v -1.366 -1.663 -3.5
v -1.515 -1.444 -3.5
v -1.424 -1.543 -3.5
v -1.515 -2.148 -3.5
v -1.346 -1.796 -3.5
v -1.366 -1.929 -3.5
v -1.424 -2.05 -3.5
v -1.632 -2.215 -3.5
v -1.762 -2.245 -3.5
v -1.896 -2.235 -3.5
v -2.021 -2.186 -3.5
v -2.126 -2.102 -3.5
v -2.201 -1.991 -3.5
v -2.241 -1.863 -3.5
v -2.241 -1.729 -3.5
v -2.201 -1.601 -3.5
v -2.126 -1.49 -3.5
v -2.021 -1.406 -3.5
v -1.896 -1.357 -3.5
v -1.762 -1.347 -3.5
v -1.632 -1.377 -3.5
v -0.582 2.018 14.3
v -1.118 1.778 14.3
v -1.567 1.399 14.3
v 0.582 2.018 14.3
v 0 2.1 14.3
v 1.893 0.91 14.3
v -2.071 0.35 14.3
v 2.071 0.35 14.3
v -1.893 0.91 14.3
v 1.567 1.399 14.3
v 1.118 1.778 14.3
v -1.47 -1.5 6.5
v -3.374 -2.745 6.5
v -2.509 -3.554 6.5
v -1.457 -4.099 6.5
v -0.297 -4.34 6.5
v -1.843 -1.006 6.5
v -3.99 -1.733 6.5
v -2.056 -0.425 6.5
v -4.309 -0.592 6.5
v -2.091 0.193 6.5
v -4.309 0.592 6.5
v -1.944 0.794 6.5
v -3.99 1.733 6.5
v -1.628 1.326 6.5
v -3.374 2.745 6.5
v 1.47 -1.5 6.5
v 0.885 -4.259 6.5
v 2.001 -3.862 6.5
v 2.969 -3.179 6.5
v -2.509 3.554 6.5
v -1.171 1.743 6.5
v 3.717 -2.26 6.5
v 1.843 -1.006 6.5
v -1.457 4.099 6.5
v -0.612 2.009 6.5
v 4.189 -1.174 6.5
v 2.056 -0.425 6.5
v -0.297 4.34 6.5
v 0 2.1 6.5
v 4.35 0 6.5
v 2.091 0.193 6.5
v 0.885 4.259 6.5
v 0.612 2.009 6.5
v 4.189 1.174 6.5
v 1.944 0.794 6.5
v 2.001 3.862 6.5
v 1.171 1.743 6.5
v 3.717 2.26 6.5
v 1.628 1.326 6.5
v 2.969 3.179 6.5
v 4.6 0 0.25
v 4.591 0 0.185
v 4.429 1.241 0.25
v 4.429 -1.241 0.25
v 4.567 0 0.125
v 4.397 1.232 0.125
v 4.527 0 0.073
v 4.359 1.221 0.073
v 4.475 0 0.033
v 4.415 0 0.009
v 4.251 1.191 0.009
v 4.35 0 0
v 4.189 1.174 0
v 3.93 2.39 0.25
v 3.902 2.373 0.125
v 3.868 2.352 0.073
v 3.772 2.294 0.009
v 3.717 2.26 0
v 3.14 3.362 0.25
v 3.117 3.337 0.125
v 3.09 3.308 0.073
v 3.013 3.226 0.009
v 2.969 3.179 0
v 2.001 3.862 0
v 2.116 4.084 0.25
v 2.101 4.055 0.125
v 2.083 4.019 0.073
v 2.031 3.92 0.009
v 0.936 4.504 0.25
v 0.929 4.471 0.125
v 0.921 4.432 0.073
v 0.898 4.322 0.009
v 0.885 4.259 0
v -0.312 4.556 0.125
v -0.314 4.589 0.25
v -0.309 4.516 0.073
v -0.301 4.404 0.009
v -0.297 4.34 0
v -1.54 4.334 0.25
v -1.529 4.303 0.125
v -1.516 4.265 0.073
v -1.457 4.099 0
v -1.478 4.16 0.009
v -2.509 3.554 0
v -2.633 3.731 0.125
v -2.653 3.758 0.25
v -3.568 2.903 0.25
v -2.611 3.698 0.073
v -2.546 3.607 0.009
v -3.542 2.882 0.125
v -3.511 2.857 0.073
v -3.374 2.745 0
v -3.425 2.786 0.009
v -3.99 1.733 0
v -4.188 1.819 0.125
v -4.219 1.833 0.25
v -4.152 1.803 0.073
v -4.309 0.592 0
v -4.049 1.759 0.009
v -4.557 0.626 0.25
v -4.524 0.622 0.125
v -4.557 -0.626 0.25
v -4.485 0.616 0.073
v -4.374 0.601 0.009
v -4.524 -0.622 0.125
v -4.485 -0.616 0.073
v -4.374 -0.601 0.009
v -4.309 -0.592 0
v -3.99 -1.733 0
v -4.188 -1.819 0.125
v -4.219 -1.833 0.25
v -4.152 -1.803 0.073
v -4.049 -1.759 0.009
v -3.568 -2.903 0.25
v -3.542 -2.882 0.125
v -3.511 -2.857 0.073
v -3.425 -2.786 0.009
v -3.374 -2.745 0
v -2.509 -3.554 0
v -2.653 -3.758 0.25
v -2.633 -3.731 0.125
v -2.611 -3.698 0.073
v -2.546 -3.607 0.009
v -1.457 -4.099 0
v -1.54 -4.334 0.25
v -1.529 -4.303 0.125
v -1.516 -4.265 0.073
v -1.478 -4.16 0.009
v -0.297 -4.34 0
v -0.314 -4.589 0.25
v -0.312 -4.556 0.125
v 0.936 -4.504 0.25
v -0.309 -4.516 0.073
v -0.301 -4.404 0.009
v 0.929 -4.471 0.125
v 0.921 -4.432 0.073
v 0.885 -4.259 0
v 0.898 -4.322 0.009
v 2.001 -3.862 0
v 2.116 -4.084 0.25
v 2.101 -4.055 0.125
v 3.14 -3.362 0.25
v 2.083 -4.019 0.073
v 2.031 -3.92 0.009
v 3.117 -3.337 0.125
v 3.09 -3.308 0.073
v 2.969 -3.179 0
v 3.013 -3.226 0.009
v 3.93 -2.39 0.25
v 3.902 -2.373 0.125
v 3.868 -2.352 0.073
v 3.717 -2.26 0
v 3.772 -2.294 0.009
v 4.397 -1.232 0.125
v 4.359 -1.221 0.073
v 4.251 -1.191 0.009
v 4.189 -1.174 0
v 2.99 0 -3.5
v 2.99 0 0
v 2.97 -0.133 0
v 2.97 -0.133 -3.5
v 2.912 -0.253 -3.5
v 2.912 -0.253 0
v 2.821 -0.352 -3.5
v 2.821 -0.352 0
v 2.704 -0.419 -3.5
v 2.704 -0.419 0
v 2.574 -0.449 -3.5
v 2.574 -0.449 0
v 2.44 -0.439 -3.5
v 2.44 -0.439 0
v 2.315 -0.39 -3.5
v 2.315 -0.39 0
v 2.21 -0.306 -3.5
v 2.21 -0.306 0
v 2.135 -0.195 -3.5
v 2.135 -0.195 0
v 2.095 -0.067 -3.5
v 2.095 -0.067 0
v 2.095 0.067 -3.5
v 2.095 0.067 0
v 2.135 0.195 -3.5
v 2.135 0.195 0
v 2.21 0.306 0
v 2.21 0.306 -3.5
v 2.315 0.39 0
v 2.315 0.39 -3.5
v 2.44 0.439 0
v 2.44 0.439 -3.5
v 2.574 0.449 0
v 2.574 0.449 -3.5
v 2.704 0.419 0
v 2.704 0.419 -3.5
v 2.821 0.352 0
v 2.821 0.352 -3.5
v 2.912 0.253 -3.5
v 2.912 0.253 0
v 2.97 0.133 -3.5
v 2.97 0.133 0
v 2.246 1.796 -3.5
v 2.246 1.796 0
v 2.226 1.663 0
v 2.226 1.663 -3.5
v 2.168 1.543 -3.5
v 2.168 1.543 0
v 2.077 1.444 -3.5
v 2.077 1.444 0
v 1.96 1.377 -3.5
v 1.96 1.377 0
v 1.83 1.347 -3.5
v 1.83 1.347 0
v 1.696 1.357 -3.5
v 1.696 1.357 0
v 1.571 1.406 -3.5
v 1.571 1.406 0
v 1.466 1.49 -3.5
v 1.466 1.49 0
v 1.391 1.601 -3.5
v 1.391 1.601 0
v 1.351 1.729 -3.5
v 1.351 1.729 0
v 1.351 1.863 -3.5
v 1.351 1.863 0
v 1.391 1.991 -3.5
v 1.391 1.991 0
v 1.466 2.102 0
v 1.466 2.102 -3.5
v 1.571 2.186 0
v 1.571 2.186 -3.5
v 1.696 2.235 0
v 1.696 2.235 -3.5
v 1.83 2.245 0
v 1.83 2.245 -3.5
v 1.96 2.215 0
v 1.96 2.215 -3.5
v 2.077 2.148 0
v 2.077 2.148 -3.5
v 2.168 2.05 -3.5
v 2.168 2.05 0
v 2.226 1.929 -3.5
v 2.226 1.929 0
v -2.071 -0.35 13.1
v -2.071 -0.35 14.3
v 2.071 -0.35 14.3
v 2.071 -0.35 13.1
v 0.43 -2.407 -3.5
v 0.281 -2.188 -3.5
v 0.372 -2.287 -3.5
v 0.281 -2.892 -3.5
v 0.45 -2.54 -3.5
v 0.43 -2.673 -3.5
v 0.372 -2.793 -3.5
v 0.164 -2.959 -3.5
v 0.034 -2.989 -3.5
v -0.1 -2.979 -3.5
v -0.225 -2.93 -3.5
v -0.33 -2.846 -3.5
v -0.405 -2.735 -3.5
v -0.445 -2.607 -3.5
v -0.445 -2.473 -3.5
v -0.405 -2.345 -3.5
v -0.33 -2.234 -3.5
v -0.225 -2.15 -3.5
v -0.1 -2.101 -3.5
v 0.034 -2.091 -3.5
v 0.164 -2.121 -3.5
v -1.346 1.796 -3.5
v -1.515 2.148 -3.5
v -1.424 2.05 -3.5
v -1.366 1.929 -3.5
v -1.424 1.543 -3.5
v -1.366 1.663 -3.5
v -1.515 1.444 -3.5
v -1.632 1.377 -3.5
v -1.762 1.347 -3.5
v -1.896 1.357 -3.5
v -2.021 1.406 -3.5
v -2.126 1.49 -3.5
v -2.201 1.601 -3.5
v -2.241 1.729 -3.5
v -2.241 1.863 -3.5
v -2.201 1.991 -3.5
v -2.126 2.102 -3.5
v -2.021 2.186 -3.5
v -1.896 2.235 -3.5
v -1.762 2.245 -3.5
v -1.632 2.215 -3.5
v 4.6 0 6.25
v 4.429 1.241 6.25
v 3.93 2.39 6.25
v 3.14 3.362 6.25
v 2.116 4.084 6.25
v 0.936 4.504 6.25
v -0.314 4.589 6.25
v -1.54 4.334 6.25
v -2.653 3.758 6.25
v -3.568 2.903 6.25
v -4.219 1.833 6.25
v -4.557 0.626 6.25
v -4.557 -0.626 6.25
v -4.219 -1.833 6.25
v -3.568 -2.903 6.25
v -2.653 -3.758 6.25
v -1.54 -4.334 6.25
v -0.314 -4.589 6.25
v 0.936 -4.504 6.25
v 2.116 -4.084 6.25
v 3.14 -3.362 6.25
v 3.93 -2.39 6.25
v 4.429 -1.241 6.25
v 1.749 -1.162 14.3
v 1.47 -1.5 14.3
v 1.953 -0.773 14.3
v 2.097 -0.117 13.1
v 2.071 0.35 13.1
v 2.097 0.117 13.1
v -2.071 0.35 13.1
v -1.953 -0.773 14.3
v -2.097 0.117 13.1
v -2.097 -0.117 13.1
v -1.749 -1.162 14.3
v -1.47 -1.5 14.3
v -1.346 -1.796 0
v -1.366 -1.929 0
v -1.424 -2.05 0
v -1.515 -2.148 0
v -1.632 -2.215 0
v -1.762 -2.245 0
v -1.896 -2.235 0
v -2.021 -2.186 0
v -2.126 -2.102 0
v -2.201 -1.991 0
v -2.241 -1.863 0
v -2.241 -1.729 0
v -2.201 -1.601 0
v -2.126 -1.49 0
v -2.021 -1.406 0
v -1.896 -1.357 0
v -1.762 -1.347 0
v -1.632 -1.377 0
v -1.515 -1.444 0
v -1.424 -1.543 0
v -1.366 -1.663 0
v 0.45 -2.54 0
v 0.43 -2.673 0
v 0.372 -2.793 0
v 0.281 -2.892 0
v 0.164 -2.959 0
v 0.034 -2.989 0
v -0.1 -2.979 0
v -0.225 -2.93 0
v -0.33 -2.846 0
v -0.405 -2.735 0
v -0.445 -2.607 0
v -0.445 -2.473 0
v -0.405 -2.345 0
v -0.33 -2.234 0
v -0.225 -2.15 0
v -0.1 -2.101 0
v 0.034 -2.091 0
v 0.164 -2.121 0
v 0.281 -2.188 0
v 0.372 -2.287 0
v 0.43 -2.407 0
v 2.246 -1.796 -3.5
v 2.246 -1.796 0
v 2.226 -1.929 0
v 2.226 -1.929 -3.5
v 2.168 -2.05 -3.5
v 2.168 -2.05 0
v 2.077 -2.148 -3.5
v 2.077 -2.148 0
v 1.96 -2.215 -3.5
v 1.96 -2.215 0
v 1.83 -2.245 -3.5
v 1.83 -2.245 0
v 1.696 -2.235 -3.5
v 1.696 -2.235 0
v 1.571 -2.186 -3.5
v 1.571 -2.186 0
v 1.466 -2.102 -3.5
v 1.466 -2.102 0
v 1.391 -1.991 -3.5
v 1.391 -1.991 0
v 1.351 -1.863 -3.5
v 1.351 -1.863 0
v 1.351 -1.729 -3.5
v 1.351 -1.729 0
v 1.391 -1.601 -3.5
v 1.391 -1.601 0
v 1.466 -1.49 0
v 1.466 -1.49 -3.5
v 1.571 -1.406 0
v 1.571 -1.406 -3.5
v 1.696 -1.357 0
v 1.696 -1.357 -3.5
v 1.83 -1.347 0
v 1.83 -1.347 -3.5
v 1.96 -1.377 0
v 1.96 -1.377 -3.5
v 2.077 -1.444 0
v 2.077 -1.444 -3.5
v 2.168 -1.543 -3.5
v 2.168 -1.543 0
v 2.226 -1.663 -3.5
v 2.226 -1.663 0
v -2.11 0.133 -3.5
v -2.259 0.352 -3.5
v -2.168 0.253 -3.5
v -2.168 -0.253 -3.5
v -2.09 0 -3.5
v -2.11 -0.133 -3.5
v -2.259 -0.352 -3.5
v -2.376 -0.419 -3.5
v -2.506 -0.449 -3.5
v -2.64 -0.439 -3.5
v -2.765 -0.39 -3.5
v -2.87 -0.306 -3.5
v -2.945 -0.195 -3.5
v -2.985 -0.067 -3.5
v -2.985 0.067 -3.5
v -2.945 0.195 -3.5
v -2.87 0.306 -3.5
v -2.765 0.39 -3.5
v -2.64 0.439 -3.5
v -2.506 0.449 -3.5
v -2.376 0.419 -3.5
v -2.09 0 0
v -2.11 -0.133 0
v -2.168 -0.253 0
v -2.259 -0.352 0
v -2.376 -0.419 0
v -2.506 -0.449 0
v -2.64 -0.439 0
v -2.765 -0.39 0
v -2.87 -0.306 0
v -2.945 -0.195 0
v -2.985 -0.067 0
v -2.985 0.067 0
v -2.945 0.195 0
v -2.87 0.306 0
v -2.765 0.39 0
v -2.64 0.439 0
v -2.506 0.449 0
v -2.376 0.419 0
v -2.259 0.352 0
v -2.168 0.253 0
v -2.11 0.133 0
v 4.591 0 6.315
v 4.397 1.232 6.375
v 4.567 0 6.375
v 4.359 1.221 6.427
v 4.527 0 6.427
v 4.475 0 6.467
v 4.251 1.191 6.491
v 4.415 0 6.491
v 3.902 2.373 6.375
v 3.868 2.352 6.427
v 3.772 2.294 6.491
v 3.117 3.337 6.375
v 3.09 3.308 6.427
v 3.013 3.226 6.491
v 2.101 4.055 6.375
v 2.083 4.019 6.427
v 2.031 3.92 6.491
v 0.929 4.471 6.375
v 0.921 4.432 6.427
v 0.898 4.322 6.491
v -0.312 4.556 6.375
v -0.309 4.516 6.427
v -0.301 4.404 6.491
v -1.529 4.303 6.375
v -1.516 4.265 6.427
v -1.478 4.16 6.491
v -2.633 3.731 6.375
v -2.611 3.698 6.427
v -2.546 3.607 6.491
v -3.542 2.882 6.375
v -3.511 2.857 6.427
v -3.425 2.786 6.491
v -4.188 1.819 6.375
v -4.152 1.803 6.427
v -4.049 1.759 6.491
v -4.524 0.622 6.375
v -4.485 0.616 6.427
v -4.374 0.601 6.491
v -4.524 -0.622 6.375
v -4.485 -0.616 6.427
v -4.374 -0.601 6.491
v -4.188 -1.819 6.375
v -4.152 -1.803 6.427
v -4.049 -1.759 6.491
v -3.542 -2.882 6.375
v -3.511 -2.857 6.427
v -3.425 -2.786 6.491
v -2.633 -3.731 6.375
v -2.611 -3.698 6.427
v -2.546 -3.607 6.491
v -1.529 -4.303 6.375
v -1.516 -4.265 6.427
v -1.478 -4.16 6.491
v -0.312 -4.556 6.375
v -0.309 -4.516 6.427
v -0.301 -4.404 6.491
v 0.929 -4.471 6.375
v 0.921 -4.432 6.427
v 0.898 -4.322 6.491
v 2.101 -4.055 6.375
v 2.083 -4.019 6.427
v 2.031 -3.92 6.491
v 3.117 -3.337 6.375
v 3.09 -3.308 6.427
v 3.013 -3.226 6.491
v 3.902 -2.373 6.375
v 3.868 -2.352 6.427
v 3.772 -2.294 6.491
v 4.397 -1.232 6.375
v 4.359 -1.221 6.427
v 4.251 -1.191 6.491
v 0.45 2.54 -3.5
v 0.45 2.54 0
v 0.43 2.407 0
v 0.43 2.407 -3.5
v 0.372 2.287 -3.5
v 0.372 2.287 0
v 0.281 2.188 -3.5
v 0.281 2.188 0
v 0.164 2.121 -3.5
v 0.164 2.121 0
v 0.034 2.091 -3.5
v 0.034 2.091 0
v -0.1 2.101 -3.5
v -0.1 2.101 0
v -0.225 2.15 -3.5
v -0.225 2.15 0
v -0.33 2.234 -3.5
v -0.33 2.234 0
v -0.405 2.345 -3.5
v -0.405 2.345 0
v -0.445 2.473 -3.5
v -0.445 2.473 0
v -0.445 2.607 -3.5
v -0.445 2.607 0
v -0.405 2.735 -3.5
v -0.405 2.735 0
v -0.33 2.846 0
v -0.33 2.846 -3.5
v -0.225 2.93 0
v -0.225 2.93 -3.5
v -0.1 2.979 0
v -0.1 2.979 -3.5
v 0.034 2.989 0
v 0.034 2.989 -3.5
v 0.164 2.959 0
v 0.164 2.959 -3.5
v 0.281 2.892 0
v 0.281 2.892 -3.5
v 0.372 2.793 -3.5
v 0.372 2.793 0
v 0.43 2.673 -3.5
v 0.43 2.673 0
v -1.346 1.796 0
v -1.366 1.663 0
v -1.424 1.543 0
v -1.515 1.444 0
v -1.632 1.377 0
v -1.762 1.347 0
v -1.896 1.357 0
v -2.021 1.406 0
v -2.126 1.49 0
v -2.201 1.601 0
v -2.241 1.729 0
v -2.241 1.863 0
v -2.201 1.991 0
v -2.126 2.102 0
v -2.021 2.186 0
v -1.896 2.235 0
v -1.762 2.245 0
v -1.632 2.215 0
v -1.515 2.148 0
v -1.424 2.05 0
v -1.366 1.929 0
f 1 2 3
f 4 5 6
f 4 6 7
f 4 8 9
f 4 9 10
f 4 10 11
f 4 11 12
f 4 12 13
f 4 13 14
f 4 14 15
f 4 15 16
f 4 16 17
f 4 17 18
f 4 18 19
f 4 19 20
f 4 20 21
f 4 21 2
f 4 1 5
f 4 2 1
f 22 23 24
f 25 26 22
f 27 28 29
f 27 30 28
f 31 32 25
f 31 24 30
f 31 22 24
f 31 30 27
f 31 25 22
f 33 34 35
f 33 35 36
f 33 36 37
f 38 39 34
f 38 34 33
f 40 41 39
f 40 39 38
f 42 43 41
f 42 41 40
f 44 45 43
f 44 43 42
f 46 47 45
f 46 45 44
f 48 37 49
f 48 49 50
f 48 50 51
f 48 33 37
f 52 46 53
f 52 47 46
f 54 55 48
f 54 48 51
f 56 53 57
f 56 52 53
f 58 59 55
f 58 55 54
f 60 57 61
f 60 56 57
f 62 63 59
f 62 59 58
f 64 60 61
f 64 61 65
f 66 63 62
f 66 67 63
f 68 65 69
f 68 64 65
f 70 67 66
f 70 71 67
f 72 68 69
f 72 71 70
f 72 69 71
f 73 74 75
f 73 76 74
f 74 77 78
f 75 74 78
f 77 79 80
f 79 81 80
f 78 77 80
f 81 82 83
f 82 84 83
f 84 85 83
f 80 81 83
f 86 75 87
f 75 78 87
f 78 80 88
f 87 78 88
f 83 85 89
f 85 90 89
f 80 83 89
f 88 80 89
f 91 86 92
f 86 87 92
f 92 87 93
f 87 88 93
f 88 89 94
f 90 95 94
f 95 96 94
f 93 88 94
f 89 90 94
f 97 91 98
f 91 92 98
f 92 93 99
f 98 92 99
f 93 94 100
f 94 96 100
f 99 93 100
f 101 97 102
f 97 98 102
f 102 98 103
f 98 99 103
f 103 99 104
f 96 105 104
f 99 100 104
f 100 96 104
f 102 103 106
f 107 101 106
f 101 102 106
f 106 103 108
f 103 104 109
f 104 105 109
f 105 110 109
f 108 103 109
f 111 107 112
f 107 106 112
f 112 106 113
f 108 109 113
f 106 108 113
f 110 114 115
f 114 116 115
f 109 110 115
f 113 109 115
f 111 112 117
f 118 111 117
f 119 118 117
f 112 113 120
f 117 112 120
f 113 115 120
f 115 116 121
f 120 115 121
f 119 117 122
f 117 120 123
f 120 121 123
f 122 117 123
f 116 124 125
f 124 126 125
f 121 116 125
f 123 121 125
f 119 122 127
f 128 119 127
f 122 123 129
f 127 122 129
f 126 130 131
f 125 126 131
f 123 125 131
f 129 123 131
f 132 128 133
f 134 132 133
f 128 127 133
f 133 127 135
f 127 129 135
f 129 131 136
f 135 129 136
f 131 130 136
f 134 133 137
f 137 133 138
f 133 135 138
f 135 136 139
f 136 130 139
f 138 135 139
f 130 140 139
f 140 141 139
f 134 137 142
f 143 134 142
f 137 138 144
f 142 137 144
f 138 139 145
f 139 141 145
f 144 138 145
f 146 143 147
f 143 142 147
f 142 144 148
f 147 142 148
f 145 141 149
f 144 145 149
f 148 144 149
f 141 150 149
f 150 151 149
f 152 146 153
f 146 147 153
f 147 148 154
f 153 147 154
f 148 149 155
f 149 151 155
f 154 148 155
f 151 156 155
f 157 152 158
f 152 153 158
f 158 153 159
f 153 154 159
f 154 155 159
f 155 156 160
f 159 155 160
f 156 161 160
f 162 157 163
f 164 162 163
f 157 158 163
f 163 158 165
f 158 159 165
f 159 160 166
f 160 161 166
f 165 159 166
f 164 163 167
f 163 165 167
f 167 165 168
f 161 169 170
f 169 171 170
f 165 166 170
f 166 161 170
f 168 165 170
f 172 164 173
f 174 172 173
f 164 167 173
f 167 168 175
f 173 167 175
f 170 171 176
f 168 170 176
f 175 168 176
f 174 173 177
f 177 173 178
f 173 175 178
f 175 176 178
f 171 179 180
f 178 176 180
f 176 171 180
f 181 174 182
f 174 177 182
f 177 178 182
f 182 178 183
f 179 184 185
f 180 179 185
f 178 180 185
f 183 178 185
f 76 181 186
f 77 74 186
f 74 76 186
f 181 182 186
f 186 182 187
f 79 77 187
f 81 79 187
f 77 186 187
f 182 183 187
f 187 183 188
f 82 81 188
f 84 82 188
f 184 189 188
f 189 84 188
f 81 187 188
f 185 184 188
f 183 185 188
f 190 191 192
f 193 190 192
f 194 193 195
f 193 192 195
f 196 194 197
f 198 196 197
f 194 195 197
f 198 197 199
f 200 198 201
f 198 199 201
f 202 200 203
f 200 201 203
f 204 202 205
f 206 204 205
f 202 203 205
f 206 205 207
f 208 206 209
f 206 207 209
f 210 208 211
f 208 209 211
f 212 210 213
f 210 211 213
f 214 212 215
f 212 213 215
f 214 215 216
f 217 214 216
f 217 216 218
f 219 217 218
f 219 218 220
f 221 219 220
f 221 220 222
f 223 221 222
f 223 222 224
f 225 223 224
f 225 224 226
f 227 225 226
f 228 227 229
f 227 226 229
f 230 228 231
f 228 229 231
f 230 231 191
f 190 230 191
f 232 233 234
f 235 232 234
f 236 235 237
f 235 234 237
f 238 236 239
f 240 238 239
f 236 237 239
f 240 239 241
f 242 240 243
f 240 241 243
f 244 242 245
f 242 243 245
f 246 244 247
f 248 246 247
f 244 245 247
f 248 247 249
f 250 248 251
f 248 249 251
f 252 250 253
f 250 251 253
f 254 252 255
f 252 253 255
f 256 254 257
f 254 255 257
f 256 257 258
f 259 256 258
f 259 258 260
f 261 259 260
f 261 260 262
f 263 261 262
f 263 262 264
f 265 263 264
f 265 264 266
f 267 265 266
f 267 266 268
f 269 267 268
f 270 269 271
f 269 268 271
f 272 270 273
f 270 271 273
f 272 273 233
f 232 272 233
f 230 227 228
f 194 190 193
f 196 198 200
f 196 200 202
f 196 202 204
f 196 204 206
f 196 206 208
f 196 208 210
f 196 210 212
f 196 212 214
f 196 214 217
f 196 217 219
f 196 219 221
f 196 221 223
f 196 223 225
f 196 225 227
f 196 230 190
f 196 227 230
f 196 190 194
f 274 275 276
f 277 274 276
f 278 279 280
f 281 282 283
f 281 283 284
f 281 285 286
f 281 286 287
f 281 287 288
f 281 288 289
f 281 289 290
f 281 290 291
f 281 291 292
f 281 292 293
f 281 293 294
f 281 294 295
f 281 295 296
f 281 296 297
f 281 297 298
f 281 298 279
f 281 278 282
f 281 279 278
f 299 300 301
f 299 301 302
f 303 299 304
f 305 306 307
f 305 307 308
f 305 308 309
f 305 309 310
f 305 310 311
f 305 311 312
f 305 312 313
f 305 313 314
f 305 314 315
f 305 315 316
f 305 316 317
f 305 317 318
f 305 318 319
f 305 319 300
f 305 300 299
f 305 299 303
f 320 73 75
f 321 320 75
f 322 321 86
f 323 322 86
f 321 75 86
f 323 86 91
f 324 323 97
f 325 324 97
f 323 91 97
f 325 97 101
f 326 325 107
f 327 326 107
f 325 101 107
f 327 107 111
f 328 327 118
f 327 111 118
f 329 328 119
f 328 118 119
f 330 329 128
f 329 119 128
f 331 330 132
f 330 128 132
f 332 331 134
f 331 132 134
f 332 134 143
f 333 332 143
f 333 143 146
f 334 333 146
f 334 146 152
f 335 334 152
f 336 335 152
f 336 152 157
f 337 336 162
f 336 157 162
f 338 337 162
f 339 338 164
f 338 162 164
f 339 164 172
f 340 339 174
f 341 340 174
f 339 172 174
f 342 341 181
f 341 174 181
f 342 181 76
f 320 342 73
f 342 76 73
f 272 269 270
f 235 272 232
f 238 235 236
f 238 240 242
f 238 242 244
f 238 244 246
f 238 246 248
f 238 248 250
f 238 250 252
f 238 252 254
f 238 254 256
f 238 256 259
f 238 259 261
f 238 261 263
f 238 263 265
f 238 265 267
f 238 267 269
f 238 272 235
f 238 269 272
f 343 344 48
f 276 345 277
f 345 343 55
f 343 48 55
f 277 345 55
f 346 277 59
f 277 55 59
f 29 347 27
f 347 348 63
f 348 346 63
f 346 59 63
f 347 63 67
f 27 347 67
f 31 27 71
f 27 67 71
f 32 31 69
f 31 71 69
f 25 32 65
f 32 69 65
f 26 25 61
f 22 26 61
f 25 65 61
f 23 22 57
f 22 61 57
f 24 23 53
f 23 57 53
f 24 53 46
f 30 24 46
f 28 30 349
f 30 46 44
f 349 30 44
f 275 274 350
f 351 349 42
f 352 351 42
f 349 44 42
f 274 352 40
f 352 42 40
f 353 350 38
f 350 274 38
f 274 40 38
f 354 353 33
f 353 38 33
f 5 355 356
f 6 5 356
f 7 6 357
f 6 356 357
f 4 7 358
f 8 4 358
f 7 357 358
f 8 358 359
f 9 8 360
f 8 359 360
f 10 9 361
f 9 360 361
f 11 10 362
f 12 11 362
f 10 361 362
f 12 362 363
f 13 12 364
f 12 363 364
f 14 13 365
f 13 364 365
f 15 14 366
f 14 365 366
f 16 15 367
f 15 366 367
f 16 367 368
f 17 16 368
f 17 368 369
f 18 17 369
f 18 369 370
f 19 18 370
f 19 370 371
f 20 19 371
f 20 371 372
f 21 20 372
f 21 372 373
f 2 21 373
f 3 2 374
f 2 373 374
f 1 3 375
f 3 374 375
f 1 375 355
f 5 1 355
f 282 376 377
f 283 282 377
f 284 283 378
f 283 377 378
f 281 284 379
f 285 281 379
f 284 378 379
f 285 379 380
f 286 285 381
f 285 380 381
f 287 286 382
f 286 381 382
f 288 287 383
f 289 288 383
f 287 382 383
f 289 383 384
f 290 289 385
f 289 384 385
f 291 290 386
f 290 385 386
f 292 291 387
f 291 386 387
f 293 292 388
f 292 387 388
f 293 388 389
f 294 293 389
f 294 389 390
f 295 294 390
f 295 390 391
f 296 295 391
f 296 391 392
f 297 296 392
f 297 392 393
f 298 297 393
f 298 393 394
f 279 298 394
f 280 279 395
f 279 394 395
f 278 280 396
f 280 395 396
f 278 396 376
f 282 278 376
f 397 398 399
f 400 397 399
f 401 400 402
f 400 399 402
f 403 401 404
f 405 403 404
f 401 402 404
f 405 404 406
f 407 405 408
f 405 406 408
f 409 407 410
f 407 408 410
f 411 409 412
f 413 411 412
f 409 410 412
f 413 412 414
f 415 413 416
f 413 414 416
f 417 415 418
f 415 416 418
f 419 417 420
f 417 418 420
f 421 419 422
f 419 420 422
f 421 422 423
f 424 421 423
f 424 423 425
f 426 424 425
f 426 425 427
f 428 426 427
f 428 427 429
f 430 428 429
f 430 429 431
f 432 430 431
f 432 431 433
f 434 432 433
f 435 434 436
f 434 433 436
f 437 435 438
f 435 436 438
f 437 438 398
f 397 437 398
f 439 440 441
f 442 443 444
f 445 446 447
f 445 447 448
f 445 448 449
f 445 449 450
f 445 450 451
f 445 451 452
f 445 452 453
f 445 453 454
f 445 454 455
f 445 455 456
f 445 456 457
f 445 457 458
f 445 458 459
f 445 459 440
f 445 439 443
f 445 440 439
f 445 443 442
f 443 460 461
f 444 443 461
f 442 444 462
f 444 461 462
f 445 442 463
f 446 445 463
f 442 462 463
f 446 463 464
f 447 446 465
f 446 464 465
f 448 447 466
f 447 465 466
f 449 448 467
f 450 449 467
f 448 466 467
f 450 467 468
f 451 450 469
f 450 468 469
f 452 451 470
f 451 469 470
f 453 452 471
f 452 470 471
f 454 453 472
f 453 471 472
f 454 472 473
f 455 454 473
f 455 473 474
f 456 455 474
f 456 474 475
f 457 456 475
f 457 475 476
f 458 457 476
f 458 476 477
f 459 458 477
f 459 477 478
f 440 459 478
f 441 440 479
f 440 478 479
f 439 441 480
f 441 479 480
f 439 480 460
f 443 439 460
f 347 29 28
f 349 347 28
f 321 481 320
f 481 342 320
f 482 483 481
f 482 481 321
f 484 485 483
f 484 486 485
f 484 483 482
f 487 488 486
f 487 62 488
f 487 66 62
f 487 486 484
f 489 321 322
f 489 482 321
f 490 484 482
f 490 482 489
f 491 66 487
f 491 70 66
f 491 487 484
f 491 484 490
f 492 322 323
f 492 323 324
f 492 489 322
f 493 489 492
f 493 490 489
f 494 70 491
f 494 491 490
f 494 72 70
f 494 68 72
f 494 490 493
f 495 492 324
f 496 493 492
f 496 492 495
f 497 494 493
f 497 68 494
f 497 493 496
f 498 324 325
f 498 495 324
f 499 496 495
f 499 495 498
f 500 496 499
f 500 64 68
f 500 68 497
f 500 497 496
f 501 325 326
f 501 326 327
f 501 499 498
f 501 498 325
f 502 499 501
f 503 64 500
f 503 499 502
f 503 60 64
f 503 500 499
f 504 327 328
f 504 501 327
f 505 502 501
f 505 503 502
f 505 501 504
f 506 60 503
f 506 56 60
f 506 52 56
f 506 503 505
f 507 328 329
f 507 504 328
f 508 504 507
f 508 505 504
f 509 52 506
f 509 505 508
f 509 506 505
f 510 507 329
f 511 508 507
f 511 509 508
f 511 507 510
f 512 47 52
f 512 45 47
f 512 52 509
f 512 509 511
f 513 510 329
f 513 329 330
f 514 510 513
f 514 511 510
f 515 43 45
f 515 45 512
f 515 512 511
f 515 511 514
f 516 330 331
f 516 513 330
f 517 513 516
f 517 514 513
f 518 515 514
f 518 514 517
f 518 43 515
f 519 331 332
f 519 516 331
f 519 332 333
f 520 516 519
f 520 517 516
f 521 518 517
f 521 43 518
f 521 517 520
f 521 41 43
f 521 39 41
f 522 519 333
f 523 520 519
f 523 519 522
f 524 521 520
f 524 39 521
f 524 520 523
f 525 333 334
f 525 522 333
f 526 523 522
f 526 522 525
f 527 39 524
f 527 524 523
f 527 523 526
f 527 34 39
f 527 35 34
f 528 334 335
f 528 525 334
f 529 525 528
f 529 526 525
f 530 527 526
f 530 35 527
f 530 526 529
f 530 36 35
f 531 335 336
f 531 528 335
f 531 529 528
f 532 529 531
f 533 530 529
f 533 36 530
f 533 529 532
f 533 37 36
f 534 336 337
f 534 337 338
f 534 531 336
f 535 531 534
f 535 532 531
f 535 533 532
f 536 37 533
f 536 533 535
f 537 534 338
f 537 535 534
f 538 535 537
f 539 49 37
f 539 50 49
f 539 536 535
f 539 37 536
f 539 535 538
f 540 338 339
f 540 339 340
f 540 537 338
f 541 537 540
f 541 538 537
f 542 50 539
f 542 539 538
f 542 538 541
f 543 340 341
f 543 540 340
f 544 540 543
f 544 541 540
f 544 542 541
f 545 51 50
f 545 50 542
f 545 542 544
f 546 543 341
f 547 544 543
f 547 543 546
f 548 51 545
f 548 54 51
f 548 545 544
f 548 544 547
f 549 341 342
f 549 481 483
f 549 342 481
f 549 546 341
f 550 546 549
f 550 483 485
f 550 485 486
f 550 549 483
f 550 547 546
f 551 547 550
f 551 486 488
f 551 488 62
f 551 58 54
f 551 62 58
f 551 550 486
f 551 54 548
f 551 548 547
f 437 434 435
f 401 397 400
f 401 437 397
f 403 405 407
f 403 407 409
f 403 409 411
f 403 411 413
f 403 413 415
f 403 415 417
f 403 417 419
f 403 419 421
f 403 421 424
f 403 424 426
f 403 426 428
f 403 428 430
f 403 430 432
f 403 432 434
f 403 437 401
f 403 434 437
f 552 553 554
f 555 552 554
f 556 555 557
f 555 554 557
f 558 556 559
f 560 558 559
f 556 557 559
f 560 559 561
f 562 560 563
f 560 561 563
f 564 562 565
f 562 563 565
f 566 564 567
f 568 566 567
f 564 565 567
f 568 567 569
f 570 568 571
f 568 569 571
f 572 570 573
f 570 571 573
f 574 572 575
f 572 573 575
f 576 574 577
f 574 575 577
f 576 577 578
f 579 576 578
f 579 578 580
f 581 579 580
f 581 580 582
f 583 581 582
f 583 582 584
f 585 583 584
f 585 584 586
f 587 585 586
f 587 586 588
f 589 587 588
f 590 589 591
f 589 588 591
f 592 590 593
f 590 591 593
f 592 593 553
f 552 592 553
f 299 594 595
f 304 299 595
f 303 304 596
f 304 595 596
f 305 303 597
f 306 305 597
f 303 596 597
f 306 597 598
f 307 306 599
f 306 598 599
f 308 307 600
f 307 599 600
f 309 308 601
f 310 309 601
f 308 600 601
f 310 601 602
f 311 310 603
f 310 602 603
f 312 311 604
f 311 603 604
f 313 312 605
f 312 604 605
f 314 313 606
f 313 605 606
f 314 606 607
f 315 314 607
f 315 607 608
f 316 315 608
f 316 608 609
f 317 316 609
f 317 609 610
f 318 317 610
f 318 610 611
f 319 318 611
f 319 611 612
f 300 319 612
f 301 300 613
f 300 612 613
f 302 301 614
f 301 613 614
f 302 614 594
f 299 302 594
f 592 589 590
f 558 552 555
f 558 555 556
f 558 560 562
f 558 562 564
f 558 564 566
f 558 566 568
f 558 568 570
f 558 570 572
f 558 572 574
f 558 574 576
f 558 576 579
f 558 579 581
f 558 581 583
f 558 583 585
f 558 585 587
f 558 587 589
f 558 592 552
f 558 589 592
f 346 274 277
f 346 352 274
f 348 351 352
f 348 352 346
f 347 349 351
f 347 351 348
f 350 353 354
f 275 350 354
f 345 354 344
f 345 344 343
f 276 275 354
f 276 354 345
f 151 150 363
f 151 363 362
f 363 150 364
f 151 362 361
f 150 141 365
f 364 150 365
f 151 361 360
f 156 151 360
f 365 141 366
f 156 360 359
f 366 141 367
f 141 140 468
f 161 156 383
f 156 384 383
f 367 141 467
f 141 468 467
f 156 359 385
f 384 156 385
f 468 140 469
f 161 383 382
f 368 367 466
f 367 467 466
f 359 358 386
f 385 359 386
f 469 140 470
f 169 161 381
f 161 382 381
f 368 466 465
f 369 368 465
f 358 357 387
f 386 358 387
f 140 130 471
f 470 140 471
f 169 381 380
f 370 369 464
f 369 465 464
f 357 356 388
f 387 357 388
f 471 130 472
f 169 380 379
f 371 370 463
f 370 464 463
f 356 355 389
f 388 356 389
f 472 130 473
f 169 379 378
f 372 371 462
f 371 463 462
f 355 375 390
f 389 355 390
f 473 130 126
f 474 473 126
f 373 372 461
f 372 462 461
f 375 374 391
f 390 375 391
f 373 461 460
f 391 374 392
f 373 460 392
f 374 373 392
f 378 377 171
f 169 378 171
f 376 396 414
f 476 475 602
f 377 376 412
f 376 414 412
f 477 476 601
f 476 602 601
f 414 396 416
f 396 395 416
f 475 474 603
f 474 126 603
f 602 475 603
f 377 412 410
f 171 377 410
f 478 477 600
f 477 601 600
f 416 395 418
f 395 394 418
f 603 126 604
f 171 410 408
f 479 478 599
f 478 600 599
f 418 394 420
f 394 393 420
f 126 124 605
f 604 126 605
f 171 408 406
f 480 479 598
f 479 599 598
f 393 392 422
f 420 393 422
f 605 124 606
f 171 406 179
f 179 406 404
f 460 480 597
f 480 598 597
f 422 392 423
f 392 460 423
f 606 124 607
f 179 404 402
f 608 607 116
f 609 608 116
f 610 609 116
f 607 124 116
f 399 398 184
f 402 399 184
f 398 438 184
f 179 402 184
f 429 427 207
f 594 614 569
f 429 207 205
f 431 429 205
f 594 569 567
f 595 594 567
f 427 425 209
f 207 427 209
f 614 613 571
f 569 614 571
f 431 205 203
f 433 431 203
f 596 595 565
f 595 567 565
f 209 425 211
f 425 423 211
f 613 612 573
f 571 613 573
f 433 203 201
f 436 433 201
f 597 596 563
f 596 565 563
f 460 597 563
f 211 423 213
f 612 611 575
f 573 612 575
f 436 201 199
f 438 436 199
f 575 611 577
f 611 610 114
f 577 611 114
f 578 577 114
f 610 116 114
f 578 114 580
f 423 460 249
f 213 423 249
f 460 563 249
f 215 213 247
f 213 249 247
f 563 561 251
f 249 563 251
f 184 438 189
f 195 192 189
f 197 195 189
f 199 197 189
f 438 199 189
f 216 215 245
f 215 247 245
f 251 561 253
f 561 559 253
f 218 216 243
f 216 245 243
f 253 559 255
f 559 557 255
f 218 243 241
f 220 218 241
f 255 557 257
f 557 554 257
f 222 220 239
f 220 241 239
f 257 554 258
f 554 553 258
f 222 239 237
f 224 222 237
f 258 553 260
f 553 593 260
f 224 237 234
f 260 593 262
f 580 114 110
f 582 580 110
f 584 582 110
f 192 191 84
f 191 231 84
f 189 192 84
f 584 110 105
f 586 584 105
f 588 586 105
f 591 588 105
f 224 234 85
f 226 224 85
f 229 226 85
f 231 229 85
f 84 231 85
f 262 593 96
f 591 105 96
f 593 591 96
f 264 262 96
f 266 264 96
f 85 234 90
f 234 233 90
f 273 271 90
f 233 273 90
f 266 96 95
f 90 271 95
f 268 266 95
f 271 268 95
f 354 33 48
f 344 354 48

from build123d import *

# Parameters (mm, degrees)
SKETCH_R        = 4.6
PAD_DEPTH       = 6.5
SKETCH001_R     = 0.45
PAD001_DEPTH    = 3.5
SKETCH002_R     = 2.1
PAD002_DEPTH    = 7.8
POCKET_DEPTH    = 1.2
SKETCH004_W     = 4.141256
SKETCH004_H     = 0.6
POCKET001_DEPTH = 7.8
FILLET_R        = 0.25


with BuildPart() as part:
    # Sketch → Pad (new body)
    with BuildSketch(Plane.XY):
        Circle(SKETCH_R)
    extrude(amount=PAD_DEPTH)

    # Sketch001 (on Face2 of Pad) → Pad001 (join)
    with BuildSketch(Plane(origin=(0, 0, 0), x_dir=(1, 0, 0), z_dir=(0, 0, -1))):
        with Locations((2.54, 0)):
            Circle(SKETCH001_R)
        with Locations((1.796051, 1.796051)):
            Circle(SKETCH001_R)
        with Locations((0, 2.54)):
            Circle(SKETCH001_R)
        with Locations((-1.796051, 1.796051)):
            Circle(SKETCH001_R)
        with Locations((-2.54, 0)):
            Circle(SKETCH001_R)
        with Locations((-1.796051, -1.796051)):
            Circle(SKETCH001_R)
        with Locations((0, -2.54)):
            Circle(SKETCH001_R)
        with Locations((1.796051, -1.796051)):
            Circle(SKETCH001_R)
    extrude(amount=PAD001_DEPTH)

    # Sketch002 (on Face3 of Pad001) → Pad002 (join)
    with BuildSketch(Plane.XY.offset(6.5)):
        Circle(SKETCH002_R)
    extrude(amount=PAD002_DEPTH)

    # Sketch003 (on Face21 of Pad002) → Pocket (cut)
    with BuildSketch(Plane.XY.offset(14.3)):
        with BuildLine():
            Line((-2.070628, -0.35), (2.070628, -0.35))
            ThreePointArc((2.070628, -0.35), (2.1, 0), (2.070628, 0.35))
            Line((2.070628, 0.35), (-2.070628, 0.35))
            ThreePointArc((-2.070628, 0.35), (-2.1, 0), (-2.070628, -0.35))
        make_face()
    extrude(amount=-POCKET_DEPTH, mode=Mode.SUBTRACT)

    # Sketch004 (on Face23 of Pocket) → Pocket001 (cut)
    with BuildSketch(Plane.XY.offset(14.3)):
        with Locations((0, -1.8)):
            Rectangle(SKETCH004_W, SKETCH004_H)
    extrude(amount=-POCKET001_DEPTH, mode=Mode.SUBTRACT)

    # Fillet
    fillet_edges = [part.edges().sort_by_distance(p)[0] for p in [
        (-4.6, 0, 6.5),
        (-4.6, 0, 0),
    ]]
    fillet(fillet_edges, radius=FILLET_R)


solid = part.part
